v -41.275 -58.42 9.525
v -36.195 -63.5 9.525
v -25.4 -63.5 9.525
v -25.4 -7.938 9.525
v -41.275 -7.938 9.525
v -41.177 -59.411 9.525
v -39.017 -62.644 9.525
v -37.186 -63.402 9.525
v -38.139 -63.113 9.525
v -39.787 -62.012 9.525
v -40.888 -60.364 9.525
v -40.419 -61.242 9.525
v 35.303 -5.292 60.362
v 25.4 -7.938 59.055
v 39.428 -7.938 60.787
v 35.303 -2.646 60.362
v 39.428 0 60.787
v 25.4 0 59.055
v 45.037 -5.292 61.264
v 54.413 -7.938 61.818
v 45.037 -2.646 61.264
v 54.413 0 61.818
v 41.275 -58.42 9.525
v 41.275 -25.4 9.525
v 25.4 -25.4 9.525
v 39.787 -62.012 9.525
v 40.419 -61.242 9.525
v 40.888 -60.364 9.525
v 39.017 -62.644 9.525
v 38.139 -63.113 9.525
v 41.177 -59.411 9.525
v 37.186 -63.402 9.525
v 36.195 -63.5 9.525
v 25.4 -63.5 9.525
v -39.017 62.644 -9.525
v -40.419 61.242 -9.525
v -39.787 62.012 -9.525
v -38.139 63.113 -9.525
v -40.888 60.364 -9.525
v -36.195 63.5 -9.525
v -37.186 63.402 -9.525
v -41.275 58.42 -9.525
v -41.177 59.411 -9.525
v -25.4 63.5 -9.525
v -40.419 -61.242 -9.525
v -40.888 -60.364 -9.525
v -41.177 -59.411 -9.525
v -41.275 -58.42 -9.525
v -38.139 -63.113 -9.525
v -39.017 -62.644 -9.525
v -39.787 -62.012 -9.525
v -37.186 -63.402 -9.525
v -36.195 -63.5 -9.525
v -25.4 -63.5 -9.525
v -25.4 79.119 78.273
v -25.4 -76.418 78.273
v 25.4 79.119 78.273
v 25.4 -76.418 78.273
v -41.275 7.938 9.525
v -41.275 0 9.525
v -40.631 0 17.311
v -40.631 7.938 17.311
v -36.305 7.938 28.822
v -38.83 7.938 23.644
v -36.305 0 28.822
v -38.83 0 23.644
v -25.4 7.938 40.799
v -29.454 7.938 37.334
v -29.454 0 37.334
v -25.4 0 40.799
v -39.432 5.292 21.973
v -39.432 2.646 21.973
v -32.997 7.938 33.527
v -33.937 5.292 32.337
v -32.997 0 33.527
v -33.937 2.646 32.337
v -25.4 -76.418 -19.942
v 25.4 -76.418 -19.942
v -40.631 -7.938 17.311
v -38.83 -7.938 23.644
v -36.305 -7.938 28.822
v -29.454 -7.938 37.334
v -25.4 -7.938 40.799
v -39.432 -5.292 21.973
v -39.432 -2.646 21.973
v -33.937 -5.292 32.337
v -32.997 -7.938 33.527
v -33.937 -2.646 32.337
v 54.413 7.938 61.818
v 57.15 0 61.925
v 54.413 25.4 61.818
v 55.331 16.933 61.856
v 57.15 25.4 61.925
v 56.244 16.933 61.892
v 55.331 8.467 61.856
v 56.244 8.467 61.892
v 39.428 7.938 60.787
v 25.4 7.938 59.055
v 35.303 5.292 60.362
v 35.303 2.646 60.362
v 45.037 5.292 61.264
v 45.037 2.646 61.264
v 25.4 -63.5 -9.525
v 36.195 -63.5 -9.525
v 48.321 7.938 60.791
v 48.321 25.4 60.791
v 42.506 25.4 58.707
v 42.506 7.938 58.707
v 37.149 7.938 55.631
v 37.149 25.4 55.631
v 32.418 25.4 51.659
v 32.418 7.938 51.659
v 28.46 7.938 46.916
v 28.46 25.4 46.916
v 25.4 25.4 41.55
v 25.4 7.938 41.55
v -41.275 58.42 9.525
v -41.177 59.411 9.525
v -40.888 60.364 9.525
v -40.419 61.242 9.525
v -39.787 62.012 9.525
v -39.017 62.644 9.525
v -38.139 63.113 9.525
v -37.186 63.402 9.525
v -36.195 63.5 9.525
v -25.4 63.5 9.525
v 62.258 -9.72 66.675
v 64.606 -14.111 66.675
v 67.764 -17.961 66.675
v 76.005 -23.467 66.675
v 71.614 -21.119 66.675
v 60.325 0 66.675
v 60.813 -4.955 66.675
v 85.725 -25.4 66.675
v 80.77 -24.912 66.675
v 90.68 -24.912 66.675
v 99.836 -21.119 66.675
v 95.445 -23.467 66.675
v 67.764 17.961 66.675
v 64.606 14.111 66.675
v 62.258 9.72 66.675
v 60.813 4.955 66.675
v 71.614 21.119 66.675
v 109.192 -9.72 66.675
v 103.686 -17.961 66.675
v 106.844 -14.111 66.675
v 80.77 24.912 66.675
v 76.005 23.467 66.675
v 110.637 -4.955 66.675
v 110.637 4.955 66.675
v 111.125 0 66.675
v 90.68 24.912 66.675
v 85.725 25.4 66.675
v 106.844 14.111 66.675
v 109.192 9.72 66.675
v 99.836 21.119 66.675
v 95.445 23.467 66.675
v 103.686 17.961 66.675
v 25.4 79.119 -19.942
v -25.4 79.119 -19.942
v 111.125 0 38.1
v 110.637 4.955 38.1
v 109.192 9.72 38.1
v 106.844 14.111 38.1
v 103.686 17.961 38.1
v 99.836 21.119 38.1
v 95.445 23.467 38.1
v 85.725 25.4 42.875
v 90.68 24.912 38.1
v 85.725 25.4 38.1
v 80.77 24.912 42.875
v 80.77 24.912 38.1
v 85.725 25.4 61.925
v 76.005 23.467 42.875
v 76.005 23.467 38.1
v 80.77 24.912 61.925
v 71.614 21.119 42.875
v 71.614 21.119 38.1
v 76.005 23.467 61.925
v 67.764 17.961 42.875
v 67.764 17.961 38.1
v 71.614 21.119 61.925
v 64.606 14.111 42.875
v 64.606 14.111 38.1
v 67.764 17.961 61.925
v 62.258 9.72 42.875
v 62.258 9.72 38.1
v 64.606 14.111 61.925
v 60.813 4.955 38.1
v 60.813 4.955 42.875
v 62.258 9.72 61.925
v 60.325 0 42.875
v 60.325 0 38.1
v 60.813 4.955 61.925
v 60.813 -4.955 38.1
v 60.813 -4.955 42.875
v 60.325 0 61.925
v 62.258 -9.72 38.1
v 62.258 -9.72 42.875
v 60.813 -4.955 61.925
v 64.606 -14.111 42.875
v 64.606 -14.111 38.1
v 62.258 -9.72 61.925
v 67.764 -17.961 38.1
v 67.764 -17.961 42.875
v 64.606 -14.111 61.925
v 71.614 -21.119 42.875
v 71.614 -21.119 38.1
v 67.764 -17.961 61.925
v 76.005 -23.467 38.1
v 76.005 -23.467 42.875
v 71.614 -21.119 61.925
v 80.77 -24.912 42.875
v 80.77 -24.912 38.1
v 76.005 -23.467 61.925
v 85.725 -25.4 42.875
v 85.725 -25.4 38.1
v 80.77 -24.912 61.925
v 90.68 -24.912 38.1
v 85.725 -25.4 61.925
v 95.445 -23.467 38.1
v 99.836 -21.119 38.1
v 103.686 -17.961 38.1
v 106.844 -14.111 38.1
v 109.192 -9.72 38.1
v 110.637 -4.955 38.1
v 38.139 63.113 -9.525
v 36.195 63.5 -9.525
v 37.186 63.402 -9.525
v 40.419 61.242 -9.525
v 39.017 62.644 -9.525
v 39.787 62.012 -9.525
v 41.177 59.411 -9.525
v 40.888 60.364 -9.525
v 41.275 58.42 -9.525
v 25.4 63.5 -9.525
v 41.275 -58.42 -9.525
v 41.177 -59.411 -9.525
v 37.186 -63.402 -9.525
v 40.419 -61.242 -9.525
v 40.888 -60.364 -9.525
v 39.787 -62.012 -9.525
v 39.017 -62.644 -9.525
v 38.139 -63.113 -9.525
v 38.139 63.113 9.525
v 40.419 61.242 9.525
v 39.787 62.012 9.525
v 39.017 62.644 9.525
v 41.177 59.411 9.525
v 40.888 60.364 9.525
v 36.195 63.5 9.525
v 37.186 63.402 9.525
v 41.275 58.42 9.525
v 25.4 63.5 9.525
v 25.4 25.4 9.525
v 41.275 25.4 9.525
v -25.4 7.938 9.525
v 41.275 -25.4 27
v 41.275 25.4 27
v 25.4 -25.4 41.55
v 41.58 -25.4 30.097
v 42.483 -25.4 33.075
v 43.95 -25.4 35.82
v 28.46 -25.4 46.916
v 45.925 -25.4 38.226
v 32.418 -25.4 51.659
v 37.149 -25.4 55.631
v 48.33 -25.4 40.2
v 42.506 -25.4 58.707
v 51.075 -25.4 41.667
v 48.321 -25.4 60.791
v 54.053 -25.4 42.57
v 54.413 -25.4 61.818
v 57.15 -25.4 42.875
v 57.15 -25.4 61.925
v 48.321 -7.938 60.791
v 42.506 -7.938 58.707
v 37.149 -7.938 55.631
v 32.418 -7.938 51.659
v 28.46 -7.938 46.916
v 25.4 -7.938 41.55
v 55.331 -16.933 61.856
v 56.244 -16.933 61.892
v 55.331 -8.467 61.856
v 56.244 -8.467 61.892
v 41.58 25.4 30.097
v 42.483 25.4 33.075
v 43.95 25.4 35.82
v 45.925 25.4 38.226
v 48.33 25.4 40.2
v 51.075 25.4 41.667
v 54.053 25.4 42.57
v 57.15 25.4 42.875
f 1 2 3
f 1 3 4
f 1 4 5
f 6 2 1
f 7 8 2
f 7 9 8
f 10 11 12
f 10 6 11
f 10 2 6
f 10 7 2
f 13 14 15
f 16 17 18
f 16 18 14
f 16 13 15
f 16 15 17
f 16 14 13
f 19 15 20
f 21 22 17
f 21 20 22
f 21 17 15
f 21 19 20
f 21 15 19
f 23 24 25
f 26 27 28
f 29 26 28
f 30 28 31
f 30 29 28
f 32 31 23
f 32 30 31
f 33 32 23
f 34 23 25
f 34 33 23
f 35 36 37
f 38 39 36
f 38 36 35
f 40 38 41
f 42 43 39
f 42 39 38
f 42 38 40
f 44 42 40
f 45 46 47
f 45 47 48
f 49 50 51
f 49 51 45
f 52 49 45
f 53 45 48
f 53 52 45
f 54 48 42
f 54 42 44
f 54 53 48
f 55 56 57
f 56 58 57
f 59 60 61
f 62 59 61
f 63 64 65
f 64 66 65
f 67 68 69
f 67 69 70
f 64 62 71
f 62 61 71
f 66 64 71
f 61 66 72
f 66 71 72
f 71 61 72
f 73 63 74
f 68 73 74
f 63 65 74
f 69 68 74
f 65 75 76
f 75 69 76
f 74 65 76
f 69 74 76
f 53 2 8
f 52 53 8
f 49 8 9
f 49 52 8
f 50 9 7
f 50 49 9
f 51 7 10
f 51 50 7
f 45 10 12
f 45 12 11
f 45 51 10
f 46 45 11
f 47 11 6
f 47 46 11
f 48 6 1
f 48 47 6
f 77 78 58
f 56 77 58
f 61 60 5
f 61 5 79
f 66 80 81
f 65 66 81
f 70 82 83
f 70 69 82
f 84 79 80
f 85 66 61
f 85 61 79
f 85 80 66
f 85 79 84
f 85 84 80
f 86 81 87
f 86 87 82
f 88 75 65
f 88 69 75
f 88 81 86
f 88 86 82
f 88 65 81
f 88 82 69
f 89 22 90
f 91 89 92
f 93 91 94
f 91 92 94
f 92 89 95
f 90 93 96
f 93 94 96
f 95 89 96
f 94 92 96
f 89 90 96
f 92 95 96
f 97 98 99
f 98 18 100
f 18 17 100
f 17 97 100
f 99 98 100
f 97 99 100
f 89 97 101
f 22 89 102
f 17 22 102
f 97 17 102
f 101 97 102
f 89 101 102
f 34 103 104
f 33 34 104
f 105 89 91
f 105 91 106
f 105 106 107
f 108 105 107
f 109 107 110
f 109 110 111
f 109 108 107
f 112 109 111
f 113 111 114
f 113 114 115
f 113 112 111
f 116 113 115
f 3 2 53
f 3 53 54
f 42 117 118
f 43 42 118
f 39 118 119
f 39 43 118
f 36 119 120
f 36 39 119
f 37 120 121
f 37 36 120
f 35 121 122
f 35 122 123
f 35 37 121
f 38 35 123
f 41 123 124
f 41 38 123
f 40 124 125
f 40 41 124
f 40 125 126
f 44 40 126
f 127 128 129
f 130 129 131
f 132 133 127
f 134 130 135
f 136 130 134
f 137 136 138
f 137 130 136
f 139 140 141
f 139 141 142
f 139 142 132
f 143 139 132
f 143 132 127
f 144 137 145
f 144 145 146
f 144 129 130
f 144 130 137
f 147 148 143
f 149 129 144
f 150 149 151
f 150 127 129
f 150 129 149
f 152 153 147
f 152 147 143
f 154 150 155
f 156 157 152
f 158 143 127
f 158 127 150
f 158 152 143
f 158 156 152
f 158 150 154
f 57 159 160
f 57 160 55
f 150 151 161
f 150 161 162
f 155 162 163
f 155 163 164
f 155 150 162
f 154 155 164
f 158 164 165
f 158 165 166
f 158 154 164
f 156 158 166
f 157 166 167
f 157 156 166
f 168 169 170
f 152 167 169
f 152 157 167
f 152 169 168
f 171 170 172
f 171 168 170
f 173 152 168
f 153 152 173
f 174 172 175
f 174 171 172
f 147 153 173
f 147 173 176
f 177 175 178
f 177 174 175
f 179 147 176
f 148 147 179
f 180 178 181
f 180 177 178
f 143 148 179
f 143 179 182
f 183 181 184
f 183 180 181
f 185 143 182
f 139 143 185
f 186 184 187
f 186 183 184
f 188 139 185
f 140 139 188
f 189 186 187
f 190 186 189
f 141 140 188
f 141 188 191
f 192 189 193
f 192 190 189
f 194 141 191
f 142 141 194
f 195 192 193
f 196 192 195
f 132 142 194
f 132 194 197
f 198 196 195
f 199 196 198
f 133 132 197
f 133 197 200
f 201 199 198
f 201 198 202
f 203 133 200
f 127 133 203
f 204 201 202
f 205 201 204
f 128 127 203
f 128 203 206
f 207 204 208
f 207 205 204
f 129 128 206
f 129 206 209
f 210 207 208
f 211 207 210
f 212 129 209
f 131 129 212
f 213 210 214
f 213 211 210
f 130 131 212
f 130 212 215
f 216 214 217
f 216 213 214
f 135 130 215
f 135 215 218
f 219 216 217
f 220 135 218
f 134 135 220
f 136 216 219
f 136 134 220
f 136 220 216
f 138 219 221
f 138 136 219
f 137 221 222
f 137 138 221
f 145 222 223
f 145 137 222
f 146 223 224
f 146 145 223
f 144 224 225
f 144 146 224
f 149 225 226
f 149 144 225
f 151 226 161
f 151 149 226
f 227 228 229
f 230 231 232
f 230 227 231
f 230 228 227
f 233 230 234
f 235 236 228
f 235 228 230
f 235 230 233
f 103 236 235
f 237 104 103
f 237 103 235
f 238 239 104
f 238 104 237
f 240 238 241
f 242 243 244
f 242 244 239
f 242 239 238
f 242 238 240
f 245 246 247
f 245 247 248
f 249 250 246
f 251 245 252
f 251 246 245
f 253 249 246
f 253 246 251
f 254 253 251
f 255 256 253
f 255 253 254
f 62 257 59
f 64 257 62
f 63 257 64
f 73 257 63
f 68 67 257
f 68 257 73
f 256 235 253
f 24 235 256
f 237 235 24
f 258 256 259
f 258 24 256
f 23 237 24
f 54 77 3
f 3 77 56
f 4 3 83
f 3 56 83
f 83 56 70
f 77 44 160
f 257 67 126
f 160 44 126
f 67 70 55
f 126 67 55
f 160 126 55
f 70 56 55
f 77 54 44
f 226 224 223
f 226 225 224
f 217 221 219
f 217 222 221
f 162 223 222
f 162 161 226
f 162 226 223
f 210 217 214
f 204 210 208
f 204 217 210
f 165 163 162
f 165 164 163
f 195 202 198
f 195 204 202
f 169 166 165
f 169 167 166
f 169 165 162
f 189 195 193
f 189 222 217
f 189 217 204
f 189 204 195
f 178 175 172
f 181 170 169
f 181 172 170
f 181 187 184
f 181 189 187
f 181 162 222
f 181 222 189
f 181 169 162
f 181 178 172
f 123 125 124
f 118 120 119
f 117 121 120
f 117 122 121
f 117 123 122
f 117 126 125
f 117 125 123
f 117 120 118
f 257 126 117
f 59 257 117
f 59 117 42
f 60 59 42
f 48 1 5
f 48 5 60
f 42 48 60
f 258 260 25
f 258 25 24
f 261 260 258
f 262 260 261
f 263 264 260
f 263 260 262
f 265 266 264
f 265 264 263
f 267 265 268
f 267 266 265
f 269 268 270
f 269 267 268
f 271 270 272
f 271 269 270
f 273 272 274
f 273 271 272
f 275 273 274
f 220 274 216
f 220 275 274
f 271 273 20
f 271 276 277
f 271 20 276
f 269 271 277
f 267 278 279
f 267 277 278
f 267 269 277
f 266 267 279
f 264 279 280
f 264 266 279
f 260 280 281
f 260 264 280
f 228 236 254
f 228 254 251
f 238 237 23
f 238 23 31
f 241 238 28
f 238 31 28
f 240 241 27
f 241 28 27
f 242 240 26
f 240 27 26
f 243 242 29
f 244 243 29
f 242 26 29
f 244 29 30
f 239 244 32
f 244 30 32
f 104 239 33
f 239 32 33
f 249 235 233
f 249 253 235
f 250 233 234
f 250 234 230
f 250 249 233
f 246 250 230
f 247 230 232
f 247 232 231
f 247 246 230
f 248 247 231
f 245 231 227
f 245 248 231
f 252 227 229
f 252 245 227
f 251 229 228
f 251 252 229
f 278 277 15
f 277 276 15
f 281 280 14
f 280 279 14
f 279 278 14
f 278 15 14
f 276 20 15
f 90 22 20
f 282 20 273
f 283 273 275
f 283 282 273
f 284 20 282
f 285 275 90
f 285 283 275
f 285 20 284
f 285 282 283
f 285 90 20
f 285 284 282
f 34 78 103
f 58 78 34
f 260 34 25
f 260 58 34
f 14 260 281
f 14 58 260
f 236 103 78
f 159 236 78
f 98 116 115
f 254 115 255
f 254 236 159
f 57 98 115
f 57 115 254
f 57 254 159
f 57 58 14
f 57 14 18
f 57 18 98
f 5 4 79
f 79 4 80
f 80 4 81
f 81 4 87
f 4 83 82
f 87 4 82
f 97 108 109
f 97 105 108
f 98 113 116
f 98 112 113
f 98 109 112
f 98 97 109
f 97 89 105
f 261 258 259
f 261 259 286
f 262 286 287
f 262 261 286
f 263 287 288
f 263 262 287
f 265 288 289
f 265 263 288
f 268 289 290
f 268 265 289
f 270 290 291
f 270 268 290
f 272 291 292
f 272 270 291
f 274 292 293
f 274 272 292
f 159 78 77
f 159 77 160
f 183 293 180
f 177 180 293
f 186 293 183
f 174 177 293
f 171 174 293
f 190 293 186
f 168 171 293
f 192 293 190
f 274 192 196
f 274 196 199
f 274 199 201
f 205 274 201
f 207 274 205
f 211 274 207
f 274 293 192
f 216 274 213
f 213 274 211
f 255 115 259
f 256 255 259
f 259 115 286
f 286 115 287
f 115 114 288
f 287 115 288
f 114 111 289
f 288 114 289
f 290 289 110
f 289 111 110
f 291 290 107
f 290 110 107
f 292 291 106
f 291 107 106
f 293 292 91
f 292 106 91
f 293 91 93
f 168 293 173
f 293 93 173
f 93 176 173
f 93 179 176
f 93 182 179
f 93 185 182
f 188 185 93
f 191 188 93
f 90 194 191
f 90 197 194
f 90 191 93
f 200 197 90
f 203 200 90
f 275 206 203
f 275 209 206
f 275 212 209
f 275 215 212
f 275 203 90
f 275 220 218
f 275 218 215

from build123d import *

# Parameters (mm, degrees)
F1_DEPTH = 63.5
F0_W     = 25.4
F0_H     = 19.05
F2_DEPTH = 25.4
F3_DEPTH = 7.9375
F5_R     = 5.08
F6_W     = 155.536965
F6_H     = 98.214656
F7_DEPTH = 25.4


with BuildPart() as f1:
    # F0 (on Front) → F1 (new body, symmetric)
    with BuildSketch(Plane.XZ):
        Polygon((22.225, 9.525), (-41.275, 9.525), (-41.275, -9.525), (41.275, -9.525), (41.275, 9.525), align=None)
    extrude(amount=F1_DEPTH, both=True)

    # F0 (on Front) → F2 (join, symmetric)
    with BuildSketch(Plane.XZ):
        with BuildLine():
            Line((22.225, 27.0002), (22.225, 9.525))
            Line((22.225, 9.525), (41.275, 9.525))
            Line((41.275, 9.525), (41.275, 27.0002))
            ThreePointArc((41.275, 27.0002), (45.92468, 38.22552), (57.15, 42.8752))
            Line((57.15, 42.8752), (60.325, 42.8752))
            Line((60.325, 42.8752), (60.325, 61.9252))
            Line((60.325, 61.9252), (57.15, 61.9252))
            add(Edge.make_bspline(
                [(54.412857, 61.817777), (55.333893, 61.857951), (56.246565, 61.893672), (57.15, 61.9252)],
                knots=[109.005179, 109.005179, 109.005179, 109.005179, 111.504536, 111.504536, 111.504536, 111.504536], degree=3))
            ThreePointArc((54.412857, 61.817777), (31.504822, 50.708436), (22.225, 27.0002))
        make_face()
        with Locations((73.025, 52.4002)):
            Rectangle(F0_W, F0_H)
    extrude(amount=F2_DEPTH, both=True)

    # F0 (on Front) → F3 (join, symmetric)
    with BuildSketch(Plane.XZ):
        with BuildLine():
            add(Edge.make_bspline(
                [(-41.275, 9.525), (-41.833885, 49.842415), (14.243471, 60.065646), (54.412857, 61.817777)],
                knots=[0, 0, 0, 0, 109.005179, 109.005179, 109.005179, 109.005179], degree=3))
            Line((-41.275, 9.525), (22.225, 9.525))
            Line((22.225, 9.525), (22.225, 27.0002))
            ThreePointArc((22.225, 27.0002), (31.504822, 50.708436), (54.412857, 61.817777))
        make_face()
    extrude(amount=F3_DEPTH, both=True)

    # F0 (on Front) → F4 (revolve)
    with BuildSketch(Plane.XZ):
        Polygon((85.725, 66.675), (85.725, 61.9252), (85.725, 42.8752), (85.725, 38.1), (111.125, 38.1), (111.125, 66.675), align=None)
    revolve(axis=Axis((85.725, 0, 52.3875), (0, 0, 1)))

    # F5
    f5_edges = [f1.edges().sort_by_distance(p)[0] for p in [
        (41.275, -63.5, 0),
        (-41.275, -63.5, 0),
        (41.275, 63.5, 0),
        (-41.275, 63.5, 0),
    ]]
    fillet(f5_edges, radius=F5_R)

    # F6 (on Right) → F7 (join, symmetric)
    with BuildSketch(Plane.YZ):
        with Locations((1.350411, 29.165588)):
            Rectangle(F6_W, F6_H)
    extrude(amount=F7_DEPTH, both=True)


solid = f1.part
